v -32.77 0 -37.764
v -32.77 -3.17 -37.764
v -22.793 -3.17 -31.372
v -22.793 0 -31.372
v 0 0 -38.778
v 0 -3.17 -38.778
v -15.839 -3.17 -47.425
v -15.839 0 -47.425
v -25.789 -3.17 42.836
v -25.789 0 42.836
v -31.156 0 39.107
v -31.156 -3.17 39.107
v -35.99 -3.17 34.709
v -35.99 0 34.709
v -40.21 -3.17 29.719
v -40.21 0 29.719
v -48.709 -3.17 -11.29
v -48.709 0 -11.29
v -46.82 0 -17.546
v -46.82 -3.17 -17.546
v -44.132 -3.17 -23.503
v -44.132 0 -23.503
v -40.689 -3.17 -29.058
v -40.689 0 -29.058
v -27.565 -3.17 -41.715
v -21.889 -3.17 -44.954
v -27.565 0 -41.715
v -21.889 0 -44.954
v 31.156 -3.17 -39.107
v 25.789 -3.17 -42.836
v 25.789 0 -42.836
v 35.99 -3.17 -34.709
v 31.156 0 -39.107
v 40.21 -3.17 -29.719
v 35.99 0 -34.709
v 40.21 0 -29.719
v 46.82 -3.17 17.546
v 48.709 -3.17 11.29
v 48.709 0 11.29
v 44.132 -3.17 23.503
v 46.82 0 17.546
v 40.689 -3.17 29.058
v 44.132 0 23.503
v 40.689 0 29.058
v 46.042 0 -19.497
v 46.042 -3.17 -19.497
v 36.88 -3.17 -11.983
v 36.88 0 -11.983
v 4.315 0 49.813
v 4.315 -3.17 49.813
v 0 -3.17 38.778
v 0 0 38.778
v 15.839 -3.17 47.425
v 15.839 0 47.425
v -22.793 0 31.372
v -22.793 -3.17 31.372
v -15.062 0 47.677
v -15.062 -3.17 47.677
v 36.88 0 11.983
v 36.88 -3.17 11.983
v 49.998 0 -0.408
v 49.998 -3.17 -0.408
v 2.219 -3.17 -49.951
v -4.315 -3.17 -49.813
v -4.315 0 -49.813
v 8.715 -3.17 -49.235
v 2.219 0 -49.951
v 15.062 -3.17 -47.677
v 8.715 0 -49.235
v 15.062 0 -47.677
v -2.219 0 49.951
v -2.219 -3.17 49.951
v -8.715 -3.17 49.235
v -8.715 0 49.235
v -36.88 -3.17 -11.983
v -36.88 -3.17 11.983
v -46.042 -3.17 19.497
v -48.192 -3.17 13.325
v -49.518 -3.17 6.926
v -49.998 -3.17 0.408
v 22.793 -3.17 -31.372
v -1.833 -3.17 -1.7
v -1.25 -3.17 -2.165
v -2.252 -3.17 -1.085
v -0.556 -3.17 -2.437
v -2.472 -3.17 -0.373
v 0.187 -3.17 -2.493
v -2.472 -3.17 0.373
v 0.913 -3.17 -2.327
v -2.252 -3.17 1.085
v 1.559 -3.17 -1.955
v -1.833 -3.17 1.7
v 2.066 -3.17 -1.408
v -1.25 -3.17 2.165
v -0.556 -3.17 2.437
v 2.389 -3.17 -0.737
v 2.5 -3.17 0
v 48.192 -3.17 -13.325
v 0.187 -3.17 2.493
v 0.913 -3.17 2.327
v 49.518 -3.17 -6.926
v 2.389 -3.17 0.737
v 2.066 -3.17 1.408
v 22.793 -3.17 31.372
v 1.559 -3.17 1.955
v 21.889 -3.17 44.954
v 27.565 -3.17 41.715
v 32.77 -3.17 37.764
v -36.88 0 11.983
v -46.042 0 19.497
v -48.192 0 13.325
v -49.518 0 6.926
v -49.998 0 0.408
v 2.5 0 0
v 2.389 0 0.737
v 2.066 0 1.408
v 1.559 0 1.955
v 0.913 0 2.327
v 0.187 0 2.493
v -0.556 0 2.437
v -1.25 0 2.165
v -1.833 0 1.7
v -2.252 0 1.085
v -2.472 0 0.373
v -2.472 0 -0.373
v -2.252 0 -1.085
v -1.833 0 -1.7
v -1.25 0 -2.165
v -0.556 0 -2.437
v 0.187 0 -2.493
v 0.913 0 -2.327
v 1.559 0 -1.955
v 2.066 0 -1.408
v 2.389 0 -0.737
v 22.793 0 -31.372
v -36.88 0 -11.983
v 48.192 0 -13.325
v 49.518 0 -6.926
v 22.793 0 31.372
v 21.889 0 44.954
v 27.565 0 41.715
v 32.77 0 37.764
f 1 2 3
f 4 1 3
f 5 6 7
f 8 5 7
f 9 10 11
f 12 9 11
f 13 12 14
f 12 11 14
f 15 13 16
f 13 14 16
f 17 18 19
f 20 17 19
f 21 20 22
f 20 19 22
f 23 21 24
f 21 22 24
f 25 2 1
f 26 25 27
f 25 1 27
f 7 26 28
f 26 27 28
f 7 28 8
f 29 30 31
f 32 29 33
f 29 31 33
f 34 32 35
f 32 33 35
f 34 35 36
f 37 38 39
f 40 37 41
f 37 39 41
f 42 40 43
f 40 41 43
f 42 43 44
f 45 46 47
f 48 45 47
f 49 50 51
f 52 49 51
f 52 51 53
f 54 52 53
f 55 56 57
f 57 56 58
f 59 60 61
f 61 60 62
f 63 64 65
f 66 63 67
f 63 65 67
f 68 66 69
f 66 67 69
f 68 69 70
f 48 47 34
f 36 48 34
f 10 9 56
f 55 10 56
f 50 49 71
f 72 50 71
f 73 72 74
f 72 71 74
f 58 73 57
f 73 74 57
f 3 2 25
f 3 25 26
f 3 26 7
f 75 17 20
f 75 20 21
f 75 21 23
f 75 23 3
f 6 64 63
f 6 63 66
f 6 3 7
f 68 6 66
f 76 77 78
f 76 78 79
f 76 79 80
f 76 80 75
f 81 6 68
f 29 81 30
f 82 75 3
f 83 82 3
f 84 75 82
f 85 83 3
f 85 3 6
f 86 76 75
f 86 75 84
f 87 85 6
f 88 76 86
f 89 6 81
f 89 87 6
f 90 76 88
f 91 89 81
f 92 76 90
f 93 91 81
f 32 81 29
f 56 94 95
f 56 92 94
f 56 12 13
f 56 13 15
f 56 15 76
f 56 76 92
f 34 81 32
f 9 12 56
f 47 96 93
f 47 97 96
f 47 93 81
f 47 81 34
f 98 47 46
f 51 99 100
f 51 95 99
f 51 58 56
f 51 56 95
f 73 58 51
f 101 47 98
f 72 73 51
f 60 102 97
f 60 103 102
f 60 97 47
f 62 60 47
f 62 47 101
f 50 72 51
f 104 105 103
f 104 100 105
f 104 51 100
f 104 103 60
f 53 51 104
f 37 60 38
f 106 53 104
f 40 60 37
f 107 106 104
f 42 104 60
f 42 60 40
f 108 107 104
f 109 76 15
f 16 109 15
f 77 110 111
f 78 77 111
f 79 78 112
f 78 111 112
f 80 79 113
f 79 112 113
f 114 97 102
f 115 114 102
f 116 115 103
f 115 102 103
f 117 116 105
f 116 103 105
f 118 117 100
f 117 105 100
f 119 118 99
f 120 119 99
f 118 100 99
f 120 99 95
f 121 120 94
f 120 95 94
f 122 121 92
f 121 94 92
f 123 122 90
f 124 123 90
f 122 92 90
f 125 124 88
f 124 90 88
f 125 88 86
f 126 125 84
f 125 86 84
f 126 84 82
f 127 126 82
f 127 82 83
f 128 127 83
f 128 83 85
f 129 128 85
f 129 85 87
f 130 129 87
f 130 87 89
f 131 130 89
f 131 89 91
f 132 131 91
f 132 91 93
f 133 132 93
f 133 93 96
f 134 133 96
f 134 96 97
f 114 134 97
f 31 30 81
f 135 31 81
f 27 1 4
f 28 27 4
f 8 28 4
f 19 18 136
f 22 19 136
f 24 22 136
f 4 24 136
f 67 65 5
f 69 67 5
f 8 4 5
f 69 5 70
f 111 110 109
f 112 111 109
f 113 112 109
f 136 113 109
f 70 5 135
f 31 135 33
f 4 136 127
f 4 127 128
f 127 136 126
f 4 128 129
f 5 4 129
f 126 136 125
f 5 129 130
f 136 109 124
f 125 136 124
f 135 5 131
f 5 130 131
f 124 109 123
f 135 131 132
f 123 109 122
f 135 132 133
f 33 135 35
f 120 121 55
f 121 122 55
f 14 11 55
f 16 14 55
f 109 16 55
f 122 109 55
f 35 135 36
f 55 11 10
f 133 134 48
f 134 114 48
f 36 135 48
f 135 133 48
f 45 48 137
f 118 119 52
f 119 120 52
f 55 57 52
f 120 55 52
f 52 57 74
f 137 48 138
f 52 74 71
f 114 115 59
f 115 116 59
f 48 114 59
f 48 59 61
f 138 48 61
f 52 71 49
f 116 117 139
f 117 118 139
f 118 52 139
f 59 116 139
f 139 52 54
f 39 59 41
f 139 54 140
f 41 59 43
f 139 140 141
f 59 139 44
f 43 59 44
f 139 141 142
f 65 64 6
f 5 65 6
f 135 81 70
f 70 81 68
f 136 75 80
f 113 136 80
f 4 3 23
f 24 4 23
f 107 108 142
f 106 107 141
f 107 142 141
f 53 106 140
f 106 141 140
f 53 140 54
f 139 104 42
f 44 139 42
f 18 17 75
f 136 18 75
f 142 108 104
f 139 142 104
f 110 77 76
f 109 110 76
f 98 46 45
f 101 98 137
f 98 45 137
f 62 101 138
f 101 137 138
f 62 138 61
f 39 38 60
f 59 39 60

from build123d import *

# Parameters (mm, degrees)
F0_R     = 50
F1_DEPTH = 3.17
F2_R     = 2.5
F3_DEPTH = 25
F5_DEPTH = 25


with BuildPart() as f1:
    # F0 (on Front) → F1 (new body)
    with BuildSketch(Plane.XZ):
        Circle(F0_R)
    extrude(amount=F1_DEPTH)

    # F2 (on face) → F3 (cut)
    with BuildSketch(Plane.XZ.offset(3.17)):
        Circle(F2_R)
    extrude(amount=-F3_DEPTH, mode=Mode.SUBTRACT)

    # F4 (on face) → F5 (cut)
    with BuildSketch(Plane.XZ.offset(3.17)):
        with BuildLine():
            Line((-22.7931910082, 31.3721360136), (-15.0621287485, 47.6773769996))
            ThreePointArc((-15.0621287485, 47.6773769996), (-20.5685569707, 45.5733964517), (-25.7891029355, 42.8359915233))
            Line((-25.7891029355, 42.8359915233), (-22.7931910082, 31.3721360136))
        make_face()
        with BuildLine():
            Line((0, 38.7780927122), (15.8385409393, 47.4251053864))
            ThreePointArc((15.8385409393, 47.4251053864), (10.1470581921, 48.9595466691), (4.3145415402, 49.8134994886))
            Line((4.3145415402, 49.8134994886), (0, 38.7780927122))
        make_face()
        with BuildLine():
            ThreePointArc((40.6894263206, 29.0580554357), (36.9868420114, 33.6448141327), (32.7701777935, 37.7639437478))
            Line((32.7701777935, 37.7639437478), (22.7931910082, 31.3721360136))
            Line((22.7931910082, 31.3721360136), (40.6894263206, 29.0580554357))
        make_face()
        with BuildLine():
            ThreePointArc((50, 0), (49.6761310759, 5.6817252069), (48.7087199469, 11.2898450446))
            Line((48.7087199469, 11.2898450446), (36.8801577634, 11.9830896575))
            Line((36.8801577634, 11.9830896575), (49.9983338301, -0.4081840445))
            ThreePointArc((49.9983338301, -0.4081840445), (49.9995834558, -0.2040937225), (50, 0))
        make_face()
        with BuildLine():
            ThreePointArc((40.2095771974, -29.7185110934), (43.4276824703, -24.7797577725), (46.0421866292, -19.4965907379))
            Line((46.0421866292, -19.4965907379), (36.8801577634, -11.9830896575))
            Line((36.8801577634, -11.9830896575), (40.2095771974, -29.7185110934))
        make_face()
        with BuildLine():
            ThreePointArc((15.0621287485, -47.6773769996), (20.5685569707, -45.5733964517), (25.7891029355, -42.8359915233))
            Line((25.7891029355, -42.8359915233), (22.7931910082, -31.3721360136))
            Line((22.7931910082, -31.3721360136), (15.0621287485, -47.6773769996))
        make_face()
        with BuildLine():
            ThreePointArc((-15.8385409393, -47.4251053864), (-10.1470581921, -48.9595466691), (-4.3145415402, -49.8134994886))
            Line((-4.3145415402, -49.8134994886), (0, -38.7780927122))
            Line((0, -38.7780927122), (-15.8385409393, -47.4251053864))
        make_face()
        with BuildLine():
            Line((-22.7931910082, -31.3721360136), (-40.6894263206, -29.0580554357))
            ThreePointArc((-40.6894263206, -29.0580554357), (-36.9868420114, -33.6448141327), (-32.7701777935, -37.7639437478))
            Line((-32.7701777935, -37.7639437478), (-22.7931910082, -31.3721360136))
        make_face()
        with BuildLine():
            Line((-36.8801577634, -11.9830896575), (-49.9983338301, 0.4081840445))
            ThreePointArc((-49.9983338301, 0.4081840445), (-49.6989093188, -5.4789061428), (-48.7087199469, -11.2898450446))
            Line((-48.7087199469, -11.2898450446), (-36.8801577634, -11.9830896575))
        make_face()
        with BuildLine():
            Line((-36.8801577634, 11.9830896575), (-40.2095771974, 29.7185110934))
            ThreePointArc((-40.2095771974, 29.7185110934), (-43.4276824703, 24.7797577725), (-46.0421866292, 19.4965907379))
            Line((-46.0421866292, 19.4965907379), (-36.8801577634, 11.9830896575))
        make_face()
    extrude(amount=-F5_DEPTH, mode=Mode.SUBTRACT)


solid = f1.part
